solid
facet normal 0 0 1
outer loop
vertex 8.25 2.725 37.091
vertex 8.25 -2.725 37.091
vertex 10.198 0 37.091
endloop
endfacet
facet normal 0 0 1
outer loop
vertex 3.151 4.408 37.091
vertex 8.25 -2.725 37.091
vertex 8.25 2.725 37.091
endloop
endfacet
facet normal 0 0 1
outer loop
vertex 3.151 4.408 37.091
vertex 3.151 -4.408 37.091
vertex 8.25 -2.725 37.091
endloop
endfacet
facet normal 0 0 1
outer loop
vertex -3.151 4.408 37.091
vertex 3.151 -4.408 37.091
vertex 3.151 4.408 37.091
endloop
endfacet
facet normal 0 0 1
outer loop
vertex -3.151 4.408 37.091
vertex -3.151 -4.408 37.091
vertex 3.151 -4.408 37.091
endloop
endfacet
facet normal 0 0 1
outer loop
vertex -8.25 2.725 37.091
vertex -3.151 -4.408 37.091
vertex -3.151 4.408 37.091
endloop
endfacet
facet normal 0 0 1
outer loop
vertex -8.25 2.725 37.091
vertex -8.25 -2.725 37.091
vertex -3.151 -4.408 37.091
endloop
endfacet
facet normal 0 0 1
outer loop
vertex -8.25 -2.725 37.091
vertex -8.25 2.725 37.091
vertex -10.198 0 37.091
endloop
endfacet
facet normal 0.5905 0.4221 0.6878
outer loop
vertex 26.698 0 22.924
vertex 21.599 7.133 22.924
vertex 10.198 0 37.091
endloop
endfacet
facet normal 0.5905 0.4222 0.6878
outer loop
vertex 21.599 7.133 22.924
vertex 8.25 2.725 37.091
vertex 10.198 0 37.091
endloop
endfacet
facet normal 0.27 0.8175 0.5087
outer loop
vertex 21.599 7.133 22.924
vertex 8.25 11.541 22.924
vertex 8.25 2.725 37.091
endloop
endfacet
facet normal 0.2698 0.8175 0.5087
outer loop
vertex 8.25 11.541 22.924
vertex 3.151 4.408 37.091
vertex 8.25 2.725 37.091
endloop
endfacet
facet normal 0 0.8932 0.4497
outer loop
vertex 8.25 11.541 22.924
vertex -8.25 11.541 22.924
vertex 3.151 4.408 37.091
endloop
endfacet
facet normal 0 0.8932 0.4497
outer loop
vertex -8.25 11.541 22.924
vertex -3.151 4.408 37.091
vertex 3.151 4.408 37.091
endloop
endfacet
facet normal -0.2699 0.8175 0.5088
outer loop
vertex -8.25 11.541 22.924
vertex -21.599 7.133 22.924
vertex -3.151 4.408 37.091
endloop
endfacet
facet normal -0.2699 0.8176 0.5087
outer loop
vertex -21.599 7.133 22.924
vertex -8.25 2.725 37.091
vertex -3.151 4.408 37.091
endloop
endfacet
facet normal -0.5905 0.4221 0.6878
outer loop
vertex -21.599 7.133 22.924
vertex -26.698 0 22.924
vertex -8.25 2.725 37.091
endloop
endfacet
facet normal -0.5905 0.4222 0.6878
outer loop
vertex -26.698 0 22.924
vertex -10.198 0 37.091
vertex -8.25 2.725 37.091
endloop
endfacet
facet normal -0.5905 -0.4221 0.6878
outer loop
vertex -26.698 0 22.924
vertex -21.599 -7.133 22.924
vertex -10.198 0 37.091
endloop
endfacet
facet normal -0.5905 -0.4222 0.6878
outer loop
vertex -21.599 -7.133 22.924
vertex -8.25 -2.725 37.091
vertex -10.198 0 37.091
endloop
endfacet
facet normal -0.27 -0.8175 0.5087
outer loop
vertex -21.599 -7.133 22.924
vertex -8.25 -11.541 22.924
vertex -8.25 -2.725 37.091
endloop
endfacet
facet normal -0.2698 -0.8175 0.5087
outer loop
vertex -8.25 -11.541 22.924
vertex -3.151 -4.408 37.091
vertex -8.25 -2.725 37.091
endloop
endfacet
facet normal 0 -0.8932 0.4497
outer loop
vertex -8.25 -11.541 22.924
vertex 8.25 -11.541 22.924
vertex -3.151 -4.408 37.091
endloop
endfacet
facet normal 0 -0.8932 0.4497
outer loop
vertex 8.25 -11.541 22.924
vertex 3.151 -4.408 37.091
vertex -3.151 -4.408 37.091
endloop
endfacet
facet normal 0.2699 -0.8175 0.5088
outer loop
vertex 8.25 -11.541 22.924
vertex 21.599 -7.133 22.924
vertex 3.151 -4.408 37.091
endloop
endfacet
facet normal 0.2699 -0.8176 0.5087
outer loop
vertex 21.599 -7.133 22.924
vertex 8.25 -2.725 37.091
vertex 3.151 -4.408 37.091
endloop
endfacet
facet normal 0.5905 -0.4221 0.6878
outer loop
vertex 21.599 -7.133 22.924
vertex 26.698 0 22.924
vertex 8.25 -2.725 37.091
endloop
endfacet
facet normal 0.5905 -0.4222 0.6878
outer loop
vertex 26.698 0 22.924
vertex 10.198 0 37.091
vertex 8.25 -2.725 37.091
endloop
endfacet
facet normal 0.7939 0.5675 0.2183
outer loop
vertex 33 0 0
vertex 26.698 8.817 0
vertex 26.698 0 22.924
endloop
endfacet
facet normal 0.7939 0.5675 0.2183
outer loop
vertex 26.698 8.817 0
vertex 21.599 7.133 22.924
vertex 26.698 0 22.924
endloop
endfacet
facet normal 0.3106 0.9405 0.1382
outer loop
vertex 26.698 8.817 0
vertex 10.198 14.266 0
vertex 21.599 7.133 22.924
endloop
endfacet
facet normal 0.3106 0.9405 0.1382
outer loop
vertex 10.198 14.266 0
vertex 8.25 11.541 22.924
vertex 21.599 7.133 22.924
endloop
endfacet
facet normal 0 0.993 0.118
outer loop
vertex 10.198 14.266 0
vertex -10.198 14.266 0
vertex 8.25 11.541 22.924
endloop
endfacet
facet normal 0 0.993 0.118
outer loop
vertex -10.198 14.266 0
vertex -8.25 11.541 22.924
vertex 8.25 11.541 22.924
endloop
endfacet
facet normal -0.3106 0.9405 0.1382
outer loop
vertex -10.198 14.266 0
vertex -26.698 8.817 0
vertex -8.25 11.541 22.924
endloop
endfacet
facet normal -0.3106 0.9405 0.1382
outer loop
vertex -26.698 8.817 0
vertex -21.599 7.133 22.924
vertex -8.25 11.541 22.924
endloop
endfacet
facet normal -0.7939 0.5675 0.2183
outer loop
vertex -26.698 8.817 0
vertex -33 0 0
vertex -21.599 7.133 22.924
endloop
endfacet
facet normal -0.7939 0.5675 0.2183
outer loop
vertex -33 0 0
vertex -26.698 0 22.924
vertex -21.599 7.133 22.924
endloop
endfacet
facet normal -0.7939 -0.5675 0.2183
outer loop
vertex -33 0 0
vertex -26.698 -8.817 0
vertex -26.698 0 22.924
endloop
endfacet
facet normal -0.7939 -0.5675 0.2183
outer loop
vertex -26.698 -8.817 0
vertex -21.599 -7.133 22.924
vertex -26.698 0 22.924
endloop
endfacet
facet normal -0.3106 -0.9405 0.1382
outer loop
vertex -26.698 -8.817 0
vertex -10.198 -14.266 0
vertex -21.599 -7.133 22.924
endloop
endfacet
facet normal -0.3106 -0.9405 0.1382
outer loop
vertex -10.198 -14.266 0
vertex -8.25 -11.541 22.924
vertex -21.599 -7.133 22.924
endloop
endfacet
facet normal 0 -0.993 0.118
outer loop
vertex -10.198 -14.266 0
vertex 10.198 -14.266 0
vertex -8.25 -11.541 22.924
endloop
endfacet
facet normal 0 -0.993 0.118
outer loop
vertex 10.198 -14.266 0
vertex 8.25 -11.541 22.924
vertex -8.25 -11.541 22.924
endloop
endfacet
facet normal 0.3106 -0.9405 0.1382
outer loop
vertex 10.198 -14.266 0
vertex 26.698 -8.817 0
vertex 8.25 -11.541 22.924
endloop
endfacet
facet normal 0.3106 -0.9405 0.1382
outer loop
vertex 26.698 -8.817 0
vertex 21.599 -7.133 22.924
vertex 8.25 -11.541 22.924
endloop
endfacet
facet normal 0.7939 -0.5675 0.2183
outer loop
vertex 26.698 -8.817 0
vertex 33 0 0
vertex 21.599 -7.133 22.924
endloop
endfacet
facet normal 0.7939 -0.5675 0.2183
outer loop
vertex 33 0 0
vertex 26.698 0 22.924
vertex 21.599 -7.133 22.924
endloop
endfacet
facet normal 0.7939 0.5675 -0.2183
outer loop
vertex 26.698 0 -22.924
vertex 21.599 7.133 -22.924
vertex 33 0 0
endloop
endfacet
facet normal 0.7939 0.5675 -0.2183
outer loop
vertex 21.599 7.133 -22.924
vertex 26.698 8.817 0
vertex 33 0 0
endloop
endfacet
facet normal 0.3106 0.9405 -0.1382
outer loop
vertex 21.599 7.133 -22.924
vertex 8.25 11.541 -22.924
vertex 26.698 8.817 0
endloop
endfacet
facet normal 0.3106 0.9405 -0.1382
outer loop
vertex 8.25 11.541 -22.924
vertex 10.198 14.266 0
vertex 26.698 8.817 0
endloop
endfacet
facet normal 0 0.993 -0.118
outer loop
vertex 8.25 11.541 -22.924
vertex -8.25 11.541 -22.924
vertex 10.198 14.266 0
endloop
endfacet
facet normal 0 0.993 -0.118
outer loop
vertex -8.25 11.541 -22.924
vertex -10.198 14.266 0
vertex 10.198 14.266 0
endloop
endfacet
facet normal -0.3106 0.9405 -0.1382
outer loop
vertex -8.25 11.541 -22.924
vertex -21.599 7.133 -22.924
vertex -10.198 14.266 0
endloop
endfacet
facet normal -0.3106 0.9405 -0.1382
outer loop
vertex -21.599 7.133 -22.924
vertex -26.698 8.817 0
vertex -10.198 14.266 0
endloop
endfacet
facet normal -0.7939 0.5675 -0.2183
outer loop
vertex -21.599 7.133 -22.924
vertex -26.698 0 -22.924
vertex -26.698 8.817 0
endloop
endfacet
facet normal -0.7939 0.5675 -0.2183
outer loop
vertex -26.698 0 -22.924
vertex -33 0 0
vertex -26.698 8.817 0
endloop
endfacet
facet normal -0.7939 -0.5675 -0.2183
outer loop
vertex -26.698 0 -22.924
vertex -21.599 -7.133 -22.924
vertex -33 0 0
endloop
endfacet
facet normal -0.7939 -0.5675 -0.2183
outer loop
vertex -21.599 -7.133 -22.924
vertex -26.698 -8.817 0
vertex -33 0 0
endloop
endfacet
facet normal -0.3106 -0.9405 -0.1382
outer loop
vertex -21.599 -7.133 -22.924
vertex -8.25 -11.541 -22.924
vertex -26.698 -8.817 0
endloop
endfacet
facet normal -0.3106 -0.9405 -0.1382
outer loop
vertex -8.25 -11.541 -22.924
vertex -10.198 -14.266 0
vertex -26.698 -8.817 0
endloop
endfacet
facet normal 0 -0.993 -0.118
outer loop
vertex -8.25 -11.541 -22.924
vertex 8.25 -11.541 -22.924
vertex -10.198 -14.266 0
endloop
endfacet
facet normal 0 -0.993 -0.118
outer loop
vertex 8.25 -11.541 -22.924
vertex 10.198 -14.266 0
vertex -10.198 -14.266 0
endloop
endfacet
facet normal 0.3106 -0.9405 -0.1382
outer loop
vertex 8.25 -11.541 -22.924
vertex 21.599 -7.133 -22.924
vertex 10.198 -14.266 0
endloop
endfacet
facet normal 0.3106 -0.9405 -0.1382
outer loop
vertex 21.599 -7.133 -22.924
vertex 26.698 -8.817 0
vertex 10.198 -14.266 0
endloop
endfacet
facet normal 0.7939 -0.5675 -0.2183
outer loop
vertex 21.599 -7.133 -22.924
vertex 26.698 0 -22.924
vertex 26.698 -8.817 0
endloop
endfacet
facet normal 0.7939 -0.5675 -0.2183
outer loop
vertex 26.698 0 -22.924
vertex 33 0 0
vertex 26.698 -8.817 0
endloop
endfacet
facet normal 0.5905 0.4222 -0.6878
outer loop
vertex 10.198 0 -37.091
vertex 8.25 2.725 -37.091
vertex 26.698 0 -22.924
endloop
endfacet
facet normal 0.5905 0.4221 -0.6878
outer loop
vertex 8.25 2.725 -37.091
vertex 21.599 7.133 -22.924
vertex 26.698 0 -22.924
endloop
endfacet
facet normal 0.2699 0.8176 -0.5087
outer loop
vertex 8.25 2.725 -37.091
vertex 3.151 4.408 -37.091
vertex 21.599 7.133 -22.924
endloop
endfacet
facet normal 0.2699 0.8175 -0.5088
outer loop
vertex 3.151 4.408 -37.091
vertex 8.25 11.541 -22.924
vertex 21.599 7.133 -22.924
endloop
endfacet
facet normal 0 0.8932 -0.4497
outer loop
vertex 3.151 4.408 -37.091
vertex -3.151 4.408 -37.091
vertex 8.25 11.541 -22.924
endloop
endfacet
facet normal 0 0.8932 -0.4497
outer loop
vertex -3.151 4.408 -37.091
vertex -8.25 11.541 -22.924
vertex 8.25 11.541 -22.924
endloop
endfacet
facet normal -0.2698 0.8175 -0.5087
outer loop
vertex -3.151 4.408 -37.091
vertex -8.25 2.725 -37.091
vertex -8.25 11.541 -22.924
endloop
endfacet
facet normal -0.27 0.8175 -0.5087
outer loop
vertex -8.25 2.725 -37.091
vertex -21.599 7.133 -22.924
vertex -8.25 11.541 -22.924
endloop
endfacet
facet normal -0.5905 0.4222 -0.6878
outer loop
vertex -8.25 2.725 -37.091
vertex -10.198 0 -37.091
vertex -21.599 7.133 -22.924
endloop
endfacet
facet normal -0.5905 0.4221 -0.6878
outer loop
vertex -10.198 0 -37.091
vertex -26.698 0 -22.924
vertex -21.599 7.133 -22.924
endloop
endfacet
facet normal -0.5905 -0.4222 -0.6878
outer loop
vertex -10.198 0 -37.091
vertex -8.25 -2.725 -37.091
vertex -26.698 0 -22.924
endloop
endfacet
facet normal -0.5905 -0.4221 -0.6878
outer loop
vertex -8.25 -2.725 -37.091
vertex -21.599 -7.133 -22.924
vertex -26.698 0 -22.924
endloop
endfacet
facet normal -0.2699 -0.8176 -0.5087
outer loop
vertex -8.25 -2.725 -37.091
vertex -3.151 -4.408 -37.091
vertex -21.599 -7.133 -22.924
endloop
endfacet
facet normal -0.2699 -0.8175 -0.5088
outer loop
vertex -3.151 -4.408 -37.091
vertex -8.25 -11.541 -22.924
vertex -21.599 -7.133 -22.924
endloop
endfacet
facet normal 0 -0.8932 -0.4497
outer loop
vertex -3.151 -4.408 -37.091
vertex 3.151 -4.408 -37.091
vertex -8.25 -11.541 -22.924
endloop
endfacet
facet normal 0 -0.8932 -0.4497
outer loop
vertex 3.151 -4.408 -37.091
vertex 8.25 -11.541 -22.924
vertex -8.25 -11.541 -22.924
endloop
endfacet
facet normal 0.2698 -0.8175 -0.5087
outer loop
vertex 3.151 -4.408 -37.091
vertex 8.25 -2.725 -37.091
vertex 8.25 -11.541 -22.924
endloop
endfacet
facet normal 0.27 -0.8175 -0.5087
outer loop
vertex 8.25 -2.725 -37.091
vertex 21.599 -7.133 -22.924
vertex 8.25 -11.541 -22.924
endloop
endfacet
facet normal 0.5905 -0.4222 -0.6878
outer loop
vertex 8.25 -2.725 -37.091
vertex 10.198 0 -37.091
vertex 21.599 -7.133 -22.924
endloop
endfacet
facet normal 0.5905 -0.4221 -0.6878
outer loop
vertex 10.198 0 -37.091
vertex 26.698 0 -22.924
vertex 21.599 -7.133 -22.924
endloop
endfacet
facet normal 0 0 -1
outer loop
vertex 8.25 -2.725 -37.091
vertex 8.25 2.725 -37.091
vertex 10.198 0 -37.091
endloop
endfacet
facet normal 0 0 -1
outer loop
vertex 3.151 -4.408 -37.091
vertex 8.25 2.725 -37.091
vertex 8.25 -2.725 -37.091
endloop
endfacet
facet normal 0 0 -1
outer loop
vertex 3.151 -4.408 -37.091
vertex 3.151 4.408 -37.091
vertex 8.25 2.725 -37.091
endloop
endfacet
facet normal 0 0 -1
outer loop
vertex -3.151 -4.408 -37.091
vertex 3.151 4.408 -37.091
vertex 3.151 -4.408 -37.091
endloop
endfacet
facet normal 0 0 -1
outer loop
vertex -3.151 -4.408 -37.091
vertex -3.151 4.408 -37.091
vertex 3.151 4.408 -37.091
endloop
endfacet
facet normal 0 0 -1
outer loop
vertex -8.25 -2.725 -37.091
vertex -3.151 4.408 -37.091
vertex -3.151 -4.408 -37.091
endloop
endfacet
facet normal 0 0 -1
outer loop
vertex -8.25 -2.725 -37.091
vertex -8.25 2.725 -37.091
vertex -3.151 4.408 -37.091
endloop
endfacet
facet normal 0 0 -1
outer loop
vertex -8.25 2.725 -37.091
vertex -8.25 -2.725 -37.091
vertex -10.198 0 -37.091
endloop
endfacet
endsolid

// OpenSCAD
// Generated by SolidPython 1.0.1 on 2020-07-29 00:46:49


scale(v = [11, 5, 13]) {
	sphere(r = 3);
}
/***********************************************
*********      SolidPython code:      **********
************************************************
 
# import packages: SolidPython
from solid import *
from solid.utils import *
from itertools import chain, combinations, permutations


class Resize:

    def __init__(self, scad_file):
        self.scad_file = scad_file
        #self.scad_file = import_scad(scad_file)
        # cone/cylinder param:
        self.r1 = 0
        self.r2 = 0
        self.h = 0
        # rectangular prism param:
        self.w = 0
        self.l = 0
        # ellipse param:
        self.r = 0

    # import OpenScad code (file name corresponds to shape)


    # classify shape + parameters
    def assign(self, param1, param2, param3):
        if self.scad_file == 'cone.scad':
            self.r1 = param1
            self.r2 = param2
            self.h = param3
        elif self.scad_file == 'cylinder.scad':
            self.r1 = param1
            self.r2 = param2
            self.h = param3
        elif self.scad_file == 'rectangularPrism.scad':
            self.h = param1
            self.l = param2
            self.w = param3
        else:
            self.r = param1
            self.h = param2

    # resize parameters
    def iterate(self):
        x = range(3, 20, 2)
        i = 1
        if self.scad_file == 'cone.scad':
            tempList = list(permutations(x, 2))
            for temp in tempList:
                param1 = temp[0]
                param2 = temp[1]
                filepath = 'produced_scad_files/' + 'cone' + str(param1) + '_' + str(param2) + '_' + '.scad'
                scad_render_to_file(cylinder(h=param1, r1=param2, r2=0), filepath)

        elif self.scad_file == 'cylinder.scad':
            tempList = list(permutations(x, 3))
            for temp in tempList:
                param1 = temp[0]
                param2 = temp[1]
                filepath = 'produced_scad_files/' + 'cylinder' + str(param1) + '_' + str(param2) + '_' + '.scad'
                scad_render_to_file(cylinder(h=param1, r1=param2, r2=param2), filepath)

        elif self.scad_file == 'rectangularPrism.scad':
            tempList = list(permutations(x, 3))
            for temp in tempList:
                param1 = temp[0]
                param2 = temp[1]
                param3 = temp[2]
                filepath = 'produced_scad_files/' + 'rectangularPrism' + str(param1) + '_' + str(param2) + '_' + str(
                    param3) + '.scad'
                scad_render_to_file(cube(size=(param1, param2, param3)), filepath)

        elif self.scad_file == 'ellipse.scad':
            tempList = list(permutations(x, 4))
            for temp in tempList:
                param1 = temp[0]
                param2 = temp[1]
                param3 = temp[2]
                param4 = temp[3]
                filepath = 'produced_scad_files/' + 'ellipse' + str(param1) + '_' + str(param2) + '_' + str(param3) + '_' + str(param4) + '.scad'
                scad_render_to_file(scale([param1, param2, param3])(sphere(r=param4)), filepath)

    def render_to_scadfile(self):
        scad_render_to_file(scad, 'example.scad') 
 
************************************************/
